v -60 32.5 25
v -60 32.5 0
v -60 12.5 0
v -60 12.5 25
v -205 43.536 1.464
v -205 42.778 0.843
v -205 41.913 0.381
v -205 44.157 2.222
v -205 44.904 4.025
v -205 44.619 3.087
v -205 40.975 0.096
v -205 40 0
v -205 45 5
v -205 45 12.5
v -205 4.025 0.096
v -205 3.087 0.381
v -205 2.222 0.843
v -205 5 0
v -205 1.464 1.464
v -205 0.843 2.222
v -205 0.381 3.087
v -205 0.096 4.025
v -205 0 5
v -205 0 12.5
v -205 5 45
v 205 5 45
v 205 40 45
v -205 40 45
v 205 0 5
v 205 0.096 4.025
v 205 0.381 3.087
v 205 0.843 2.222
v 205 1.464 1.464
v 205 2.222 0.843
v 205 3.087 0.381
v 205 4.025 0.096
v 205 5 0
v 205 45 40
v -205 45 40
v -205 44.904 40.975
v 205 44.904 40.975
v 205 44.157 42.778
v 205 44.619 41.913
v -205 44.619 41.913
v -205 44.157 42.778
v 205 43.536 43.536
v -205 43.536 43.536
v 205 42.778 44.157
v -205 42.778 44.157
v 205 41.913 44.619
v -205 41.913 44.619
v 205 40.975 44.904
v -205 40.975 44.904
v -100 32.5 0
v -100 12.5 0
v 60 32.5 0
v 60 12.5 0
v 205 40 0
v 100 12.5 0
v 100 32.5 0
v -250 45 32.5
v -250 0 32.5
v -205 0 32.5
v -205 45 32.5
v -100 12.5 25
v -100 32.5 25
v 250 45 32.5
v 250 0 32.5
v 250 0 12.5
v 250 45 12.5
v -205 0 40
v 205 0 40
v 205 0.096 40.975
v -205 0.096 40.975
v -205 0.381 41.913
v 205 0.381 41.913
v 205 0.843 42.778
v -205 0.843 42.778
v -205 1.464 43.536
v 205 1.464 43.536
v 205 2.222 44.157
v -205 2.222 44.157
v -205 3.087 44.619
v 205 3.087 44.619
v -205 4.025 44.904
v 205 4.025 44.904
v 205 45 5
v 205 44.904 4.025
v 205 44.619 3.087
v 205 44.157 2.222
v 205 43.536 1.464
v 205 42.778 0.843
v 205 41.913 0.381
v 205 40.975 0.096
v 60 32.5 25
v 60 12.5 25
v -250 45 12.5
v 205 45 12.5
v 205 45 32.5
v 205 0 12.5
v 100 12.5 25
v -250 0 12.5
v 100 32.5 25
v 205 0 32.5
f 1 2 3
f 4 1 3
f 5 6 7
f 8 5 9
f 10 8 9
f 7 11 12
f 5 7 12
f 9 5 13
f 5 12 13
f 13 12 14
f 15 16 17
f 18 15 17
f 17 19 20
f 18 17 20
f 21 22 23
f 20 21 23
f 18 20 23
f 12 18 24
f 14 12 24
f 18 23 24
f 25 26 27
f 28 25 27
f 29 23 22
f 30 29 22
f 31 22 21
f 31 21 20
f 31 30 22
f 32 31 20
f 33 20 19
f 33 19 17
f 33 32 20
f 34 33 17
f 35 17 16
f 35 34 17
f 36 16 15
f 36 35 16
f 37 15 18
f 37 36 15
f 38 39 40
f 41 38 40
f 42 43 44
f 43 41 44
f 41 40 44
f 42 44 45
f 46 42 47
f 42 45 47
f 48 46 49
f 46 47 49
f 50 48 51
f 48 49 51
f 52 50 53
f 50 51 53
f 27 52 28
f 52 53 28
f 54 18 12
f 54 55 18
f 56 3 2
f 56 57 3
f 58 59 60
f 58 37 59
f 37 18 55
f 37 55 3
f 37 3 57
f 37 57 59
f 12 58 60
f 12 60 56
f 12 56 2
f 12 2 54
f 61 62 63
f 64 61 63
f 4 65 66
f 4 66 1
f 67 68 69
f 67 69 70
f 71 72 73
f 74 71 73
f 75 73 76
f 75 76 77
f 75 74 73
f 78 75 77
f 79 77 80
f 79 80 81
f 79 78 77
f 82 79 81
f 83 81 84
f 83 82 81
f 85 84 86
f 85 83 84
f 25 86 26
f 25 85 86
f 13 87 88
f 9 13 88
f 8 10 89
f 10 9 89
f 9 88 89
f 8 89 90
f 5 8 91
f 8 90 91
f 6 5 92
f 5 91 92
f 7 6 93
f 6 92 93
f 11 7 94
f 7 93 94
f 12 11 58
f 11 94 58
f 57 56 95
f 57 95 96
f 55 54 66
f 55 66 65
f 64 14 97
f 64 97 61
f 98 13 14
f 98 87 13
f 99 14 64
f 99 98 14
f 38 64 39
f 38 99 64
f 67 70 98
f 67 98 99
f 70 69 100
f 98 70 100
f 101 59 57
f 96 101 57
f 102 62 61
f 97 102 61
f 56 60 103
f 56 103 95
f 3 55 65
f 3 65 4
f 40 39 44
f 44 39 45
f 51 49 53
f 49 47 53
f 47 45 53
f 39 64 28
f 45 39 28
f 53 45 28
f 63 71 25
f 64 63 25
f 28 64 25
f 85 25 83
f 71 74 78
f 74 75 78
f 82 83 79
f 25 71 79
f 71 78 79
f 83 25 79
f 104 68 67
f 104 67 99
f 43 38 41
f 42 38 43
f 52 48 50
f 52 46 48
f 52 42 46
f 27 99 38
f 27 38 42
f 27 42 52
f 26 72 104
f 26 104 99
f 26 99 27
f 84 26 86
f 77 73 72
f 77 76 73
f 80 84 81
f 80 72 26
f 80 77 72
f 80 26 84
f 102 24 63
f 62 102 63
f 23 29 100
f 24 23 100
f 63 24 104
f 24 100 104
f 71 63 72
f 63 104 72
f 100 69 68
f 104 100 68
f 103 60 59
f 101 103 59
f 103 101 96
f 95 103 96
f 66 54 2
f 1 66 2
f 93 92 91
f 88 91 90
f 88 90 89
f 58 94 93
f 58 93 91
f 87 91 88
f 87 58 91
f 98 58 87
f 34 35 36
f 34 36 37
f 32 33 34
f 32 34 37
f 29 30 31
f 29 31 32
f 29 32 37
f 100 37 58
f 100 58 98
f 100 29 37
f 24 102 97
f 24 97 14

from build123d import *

# Parameters (mm, degrees)
F0_W     = 45
F0_H     = 45
F1_DEPTH = 250
F2_R     = 5
F3_W     = 45
F3_H     = 12.5
F4_DEPTH = 45.001
F5_W     = 40
F5_H     = 20
F6_DEPTH = 25
F7_W     = 40
F7_H     = 20
F8_DEPTH = 25


# Not quite as in the source:
# - a pattern or mirror of a feature is missing from the dataset's text; its kind, count and spacing are read off the source's solid


with BuildPart() as f1:
    # F0 (on Right) → F1 (new body, symmetric)
    with BuildSketch(Plane.YZ):
        with Locations((22.5, 22.5)):
            Rectangle(F0_W, F0_H)
    extrude(amount=F1_DEPTH, both=True)

    # F2
    f2_edges = [f1.edges().sort_by_distance(p)[0] for p in [
        (0, 0, 45),
        (0, 45, 45),
        (0, 0, 0),
        (0, 45, 0),
    ]]
    fillet(f2_edges, radius=F2_R)

    # F3 (on face) → F4 (cut, through all)
    with BuildSketch(Plane.XZ):
        with Locations((-227.5, 6.25)):
            Rectangle(F3_W, F3_H)
        with Locations((-227.5, 38.75)):
            Rectangle(F3_W, F3_H)
    f4 = extrude(amount=-F4_DEPTH, mode=Mode.SUBTRACT)

    # F4_copies: F4 across plane
    add(f4.mirror(Plane(origin=(0, 0, 0), x_dir=(0, 0, 1), z_dir=(1, 0, 0))), mode=Mode.SUBTRACT)

    # F5 (on face) → F6 (cut)
    with BuildSketch(Plane(origin=(-250, 0, 0), x_dir=(0, -1, 0), z_dir=(-1, 0, 0))):
        with Locations((150, 22.5)):
            Rectangle(F5_W, F5_H)
    extrude(amount=-F6_DEPTH, mode=Mode.SUBTRACT)

    # F7 (on face) → F8 (cut)
    with BuildSketch(Plane(origin=(0, 0, 0), x_dir=(1, 0, 0), z_dir=(0, 0, -1))):
        with Locations((-80, -22.5)):
            Rectangle(F7_W, F7_H)
    f8 = extrude(amount=-F8_DEPTH, mode=Mode.SUBTRACT)

    # F8_copies: F8 across plane
    add(f8.mirror(Plane(origin=(0, 0, 0), x_dir=(0, 0, 1), z_dir=(1, 0, 0))), mode=Mode.SUBTRACT)


solid = f1.part
